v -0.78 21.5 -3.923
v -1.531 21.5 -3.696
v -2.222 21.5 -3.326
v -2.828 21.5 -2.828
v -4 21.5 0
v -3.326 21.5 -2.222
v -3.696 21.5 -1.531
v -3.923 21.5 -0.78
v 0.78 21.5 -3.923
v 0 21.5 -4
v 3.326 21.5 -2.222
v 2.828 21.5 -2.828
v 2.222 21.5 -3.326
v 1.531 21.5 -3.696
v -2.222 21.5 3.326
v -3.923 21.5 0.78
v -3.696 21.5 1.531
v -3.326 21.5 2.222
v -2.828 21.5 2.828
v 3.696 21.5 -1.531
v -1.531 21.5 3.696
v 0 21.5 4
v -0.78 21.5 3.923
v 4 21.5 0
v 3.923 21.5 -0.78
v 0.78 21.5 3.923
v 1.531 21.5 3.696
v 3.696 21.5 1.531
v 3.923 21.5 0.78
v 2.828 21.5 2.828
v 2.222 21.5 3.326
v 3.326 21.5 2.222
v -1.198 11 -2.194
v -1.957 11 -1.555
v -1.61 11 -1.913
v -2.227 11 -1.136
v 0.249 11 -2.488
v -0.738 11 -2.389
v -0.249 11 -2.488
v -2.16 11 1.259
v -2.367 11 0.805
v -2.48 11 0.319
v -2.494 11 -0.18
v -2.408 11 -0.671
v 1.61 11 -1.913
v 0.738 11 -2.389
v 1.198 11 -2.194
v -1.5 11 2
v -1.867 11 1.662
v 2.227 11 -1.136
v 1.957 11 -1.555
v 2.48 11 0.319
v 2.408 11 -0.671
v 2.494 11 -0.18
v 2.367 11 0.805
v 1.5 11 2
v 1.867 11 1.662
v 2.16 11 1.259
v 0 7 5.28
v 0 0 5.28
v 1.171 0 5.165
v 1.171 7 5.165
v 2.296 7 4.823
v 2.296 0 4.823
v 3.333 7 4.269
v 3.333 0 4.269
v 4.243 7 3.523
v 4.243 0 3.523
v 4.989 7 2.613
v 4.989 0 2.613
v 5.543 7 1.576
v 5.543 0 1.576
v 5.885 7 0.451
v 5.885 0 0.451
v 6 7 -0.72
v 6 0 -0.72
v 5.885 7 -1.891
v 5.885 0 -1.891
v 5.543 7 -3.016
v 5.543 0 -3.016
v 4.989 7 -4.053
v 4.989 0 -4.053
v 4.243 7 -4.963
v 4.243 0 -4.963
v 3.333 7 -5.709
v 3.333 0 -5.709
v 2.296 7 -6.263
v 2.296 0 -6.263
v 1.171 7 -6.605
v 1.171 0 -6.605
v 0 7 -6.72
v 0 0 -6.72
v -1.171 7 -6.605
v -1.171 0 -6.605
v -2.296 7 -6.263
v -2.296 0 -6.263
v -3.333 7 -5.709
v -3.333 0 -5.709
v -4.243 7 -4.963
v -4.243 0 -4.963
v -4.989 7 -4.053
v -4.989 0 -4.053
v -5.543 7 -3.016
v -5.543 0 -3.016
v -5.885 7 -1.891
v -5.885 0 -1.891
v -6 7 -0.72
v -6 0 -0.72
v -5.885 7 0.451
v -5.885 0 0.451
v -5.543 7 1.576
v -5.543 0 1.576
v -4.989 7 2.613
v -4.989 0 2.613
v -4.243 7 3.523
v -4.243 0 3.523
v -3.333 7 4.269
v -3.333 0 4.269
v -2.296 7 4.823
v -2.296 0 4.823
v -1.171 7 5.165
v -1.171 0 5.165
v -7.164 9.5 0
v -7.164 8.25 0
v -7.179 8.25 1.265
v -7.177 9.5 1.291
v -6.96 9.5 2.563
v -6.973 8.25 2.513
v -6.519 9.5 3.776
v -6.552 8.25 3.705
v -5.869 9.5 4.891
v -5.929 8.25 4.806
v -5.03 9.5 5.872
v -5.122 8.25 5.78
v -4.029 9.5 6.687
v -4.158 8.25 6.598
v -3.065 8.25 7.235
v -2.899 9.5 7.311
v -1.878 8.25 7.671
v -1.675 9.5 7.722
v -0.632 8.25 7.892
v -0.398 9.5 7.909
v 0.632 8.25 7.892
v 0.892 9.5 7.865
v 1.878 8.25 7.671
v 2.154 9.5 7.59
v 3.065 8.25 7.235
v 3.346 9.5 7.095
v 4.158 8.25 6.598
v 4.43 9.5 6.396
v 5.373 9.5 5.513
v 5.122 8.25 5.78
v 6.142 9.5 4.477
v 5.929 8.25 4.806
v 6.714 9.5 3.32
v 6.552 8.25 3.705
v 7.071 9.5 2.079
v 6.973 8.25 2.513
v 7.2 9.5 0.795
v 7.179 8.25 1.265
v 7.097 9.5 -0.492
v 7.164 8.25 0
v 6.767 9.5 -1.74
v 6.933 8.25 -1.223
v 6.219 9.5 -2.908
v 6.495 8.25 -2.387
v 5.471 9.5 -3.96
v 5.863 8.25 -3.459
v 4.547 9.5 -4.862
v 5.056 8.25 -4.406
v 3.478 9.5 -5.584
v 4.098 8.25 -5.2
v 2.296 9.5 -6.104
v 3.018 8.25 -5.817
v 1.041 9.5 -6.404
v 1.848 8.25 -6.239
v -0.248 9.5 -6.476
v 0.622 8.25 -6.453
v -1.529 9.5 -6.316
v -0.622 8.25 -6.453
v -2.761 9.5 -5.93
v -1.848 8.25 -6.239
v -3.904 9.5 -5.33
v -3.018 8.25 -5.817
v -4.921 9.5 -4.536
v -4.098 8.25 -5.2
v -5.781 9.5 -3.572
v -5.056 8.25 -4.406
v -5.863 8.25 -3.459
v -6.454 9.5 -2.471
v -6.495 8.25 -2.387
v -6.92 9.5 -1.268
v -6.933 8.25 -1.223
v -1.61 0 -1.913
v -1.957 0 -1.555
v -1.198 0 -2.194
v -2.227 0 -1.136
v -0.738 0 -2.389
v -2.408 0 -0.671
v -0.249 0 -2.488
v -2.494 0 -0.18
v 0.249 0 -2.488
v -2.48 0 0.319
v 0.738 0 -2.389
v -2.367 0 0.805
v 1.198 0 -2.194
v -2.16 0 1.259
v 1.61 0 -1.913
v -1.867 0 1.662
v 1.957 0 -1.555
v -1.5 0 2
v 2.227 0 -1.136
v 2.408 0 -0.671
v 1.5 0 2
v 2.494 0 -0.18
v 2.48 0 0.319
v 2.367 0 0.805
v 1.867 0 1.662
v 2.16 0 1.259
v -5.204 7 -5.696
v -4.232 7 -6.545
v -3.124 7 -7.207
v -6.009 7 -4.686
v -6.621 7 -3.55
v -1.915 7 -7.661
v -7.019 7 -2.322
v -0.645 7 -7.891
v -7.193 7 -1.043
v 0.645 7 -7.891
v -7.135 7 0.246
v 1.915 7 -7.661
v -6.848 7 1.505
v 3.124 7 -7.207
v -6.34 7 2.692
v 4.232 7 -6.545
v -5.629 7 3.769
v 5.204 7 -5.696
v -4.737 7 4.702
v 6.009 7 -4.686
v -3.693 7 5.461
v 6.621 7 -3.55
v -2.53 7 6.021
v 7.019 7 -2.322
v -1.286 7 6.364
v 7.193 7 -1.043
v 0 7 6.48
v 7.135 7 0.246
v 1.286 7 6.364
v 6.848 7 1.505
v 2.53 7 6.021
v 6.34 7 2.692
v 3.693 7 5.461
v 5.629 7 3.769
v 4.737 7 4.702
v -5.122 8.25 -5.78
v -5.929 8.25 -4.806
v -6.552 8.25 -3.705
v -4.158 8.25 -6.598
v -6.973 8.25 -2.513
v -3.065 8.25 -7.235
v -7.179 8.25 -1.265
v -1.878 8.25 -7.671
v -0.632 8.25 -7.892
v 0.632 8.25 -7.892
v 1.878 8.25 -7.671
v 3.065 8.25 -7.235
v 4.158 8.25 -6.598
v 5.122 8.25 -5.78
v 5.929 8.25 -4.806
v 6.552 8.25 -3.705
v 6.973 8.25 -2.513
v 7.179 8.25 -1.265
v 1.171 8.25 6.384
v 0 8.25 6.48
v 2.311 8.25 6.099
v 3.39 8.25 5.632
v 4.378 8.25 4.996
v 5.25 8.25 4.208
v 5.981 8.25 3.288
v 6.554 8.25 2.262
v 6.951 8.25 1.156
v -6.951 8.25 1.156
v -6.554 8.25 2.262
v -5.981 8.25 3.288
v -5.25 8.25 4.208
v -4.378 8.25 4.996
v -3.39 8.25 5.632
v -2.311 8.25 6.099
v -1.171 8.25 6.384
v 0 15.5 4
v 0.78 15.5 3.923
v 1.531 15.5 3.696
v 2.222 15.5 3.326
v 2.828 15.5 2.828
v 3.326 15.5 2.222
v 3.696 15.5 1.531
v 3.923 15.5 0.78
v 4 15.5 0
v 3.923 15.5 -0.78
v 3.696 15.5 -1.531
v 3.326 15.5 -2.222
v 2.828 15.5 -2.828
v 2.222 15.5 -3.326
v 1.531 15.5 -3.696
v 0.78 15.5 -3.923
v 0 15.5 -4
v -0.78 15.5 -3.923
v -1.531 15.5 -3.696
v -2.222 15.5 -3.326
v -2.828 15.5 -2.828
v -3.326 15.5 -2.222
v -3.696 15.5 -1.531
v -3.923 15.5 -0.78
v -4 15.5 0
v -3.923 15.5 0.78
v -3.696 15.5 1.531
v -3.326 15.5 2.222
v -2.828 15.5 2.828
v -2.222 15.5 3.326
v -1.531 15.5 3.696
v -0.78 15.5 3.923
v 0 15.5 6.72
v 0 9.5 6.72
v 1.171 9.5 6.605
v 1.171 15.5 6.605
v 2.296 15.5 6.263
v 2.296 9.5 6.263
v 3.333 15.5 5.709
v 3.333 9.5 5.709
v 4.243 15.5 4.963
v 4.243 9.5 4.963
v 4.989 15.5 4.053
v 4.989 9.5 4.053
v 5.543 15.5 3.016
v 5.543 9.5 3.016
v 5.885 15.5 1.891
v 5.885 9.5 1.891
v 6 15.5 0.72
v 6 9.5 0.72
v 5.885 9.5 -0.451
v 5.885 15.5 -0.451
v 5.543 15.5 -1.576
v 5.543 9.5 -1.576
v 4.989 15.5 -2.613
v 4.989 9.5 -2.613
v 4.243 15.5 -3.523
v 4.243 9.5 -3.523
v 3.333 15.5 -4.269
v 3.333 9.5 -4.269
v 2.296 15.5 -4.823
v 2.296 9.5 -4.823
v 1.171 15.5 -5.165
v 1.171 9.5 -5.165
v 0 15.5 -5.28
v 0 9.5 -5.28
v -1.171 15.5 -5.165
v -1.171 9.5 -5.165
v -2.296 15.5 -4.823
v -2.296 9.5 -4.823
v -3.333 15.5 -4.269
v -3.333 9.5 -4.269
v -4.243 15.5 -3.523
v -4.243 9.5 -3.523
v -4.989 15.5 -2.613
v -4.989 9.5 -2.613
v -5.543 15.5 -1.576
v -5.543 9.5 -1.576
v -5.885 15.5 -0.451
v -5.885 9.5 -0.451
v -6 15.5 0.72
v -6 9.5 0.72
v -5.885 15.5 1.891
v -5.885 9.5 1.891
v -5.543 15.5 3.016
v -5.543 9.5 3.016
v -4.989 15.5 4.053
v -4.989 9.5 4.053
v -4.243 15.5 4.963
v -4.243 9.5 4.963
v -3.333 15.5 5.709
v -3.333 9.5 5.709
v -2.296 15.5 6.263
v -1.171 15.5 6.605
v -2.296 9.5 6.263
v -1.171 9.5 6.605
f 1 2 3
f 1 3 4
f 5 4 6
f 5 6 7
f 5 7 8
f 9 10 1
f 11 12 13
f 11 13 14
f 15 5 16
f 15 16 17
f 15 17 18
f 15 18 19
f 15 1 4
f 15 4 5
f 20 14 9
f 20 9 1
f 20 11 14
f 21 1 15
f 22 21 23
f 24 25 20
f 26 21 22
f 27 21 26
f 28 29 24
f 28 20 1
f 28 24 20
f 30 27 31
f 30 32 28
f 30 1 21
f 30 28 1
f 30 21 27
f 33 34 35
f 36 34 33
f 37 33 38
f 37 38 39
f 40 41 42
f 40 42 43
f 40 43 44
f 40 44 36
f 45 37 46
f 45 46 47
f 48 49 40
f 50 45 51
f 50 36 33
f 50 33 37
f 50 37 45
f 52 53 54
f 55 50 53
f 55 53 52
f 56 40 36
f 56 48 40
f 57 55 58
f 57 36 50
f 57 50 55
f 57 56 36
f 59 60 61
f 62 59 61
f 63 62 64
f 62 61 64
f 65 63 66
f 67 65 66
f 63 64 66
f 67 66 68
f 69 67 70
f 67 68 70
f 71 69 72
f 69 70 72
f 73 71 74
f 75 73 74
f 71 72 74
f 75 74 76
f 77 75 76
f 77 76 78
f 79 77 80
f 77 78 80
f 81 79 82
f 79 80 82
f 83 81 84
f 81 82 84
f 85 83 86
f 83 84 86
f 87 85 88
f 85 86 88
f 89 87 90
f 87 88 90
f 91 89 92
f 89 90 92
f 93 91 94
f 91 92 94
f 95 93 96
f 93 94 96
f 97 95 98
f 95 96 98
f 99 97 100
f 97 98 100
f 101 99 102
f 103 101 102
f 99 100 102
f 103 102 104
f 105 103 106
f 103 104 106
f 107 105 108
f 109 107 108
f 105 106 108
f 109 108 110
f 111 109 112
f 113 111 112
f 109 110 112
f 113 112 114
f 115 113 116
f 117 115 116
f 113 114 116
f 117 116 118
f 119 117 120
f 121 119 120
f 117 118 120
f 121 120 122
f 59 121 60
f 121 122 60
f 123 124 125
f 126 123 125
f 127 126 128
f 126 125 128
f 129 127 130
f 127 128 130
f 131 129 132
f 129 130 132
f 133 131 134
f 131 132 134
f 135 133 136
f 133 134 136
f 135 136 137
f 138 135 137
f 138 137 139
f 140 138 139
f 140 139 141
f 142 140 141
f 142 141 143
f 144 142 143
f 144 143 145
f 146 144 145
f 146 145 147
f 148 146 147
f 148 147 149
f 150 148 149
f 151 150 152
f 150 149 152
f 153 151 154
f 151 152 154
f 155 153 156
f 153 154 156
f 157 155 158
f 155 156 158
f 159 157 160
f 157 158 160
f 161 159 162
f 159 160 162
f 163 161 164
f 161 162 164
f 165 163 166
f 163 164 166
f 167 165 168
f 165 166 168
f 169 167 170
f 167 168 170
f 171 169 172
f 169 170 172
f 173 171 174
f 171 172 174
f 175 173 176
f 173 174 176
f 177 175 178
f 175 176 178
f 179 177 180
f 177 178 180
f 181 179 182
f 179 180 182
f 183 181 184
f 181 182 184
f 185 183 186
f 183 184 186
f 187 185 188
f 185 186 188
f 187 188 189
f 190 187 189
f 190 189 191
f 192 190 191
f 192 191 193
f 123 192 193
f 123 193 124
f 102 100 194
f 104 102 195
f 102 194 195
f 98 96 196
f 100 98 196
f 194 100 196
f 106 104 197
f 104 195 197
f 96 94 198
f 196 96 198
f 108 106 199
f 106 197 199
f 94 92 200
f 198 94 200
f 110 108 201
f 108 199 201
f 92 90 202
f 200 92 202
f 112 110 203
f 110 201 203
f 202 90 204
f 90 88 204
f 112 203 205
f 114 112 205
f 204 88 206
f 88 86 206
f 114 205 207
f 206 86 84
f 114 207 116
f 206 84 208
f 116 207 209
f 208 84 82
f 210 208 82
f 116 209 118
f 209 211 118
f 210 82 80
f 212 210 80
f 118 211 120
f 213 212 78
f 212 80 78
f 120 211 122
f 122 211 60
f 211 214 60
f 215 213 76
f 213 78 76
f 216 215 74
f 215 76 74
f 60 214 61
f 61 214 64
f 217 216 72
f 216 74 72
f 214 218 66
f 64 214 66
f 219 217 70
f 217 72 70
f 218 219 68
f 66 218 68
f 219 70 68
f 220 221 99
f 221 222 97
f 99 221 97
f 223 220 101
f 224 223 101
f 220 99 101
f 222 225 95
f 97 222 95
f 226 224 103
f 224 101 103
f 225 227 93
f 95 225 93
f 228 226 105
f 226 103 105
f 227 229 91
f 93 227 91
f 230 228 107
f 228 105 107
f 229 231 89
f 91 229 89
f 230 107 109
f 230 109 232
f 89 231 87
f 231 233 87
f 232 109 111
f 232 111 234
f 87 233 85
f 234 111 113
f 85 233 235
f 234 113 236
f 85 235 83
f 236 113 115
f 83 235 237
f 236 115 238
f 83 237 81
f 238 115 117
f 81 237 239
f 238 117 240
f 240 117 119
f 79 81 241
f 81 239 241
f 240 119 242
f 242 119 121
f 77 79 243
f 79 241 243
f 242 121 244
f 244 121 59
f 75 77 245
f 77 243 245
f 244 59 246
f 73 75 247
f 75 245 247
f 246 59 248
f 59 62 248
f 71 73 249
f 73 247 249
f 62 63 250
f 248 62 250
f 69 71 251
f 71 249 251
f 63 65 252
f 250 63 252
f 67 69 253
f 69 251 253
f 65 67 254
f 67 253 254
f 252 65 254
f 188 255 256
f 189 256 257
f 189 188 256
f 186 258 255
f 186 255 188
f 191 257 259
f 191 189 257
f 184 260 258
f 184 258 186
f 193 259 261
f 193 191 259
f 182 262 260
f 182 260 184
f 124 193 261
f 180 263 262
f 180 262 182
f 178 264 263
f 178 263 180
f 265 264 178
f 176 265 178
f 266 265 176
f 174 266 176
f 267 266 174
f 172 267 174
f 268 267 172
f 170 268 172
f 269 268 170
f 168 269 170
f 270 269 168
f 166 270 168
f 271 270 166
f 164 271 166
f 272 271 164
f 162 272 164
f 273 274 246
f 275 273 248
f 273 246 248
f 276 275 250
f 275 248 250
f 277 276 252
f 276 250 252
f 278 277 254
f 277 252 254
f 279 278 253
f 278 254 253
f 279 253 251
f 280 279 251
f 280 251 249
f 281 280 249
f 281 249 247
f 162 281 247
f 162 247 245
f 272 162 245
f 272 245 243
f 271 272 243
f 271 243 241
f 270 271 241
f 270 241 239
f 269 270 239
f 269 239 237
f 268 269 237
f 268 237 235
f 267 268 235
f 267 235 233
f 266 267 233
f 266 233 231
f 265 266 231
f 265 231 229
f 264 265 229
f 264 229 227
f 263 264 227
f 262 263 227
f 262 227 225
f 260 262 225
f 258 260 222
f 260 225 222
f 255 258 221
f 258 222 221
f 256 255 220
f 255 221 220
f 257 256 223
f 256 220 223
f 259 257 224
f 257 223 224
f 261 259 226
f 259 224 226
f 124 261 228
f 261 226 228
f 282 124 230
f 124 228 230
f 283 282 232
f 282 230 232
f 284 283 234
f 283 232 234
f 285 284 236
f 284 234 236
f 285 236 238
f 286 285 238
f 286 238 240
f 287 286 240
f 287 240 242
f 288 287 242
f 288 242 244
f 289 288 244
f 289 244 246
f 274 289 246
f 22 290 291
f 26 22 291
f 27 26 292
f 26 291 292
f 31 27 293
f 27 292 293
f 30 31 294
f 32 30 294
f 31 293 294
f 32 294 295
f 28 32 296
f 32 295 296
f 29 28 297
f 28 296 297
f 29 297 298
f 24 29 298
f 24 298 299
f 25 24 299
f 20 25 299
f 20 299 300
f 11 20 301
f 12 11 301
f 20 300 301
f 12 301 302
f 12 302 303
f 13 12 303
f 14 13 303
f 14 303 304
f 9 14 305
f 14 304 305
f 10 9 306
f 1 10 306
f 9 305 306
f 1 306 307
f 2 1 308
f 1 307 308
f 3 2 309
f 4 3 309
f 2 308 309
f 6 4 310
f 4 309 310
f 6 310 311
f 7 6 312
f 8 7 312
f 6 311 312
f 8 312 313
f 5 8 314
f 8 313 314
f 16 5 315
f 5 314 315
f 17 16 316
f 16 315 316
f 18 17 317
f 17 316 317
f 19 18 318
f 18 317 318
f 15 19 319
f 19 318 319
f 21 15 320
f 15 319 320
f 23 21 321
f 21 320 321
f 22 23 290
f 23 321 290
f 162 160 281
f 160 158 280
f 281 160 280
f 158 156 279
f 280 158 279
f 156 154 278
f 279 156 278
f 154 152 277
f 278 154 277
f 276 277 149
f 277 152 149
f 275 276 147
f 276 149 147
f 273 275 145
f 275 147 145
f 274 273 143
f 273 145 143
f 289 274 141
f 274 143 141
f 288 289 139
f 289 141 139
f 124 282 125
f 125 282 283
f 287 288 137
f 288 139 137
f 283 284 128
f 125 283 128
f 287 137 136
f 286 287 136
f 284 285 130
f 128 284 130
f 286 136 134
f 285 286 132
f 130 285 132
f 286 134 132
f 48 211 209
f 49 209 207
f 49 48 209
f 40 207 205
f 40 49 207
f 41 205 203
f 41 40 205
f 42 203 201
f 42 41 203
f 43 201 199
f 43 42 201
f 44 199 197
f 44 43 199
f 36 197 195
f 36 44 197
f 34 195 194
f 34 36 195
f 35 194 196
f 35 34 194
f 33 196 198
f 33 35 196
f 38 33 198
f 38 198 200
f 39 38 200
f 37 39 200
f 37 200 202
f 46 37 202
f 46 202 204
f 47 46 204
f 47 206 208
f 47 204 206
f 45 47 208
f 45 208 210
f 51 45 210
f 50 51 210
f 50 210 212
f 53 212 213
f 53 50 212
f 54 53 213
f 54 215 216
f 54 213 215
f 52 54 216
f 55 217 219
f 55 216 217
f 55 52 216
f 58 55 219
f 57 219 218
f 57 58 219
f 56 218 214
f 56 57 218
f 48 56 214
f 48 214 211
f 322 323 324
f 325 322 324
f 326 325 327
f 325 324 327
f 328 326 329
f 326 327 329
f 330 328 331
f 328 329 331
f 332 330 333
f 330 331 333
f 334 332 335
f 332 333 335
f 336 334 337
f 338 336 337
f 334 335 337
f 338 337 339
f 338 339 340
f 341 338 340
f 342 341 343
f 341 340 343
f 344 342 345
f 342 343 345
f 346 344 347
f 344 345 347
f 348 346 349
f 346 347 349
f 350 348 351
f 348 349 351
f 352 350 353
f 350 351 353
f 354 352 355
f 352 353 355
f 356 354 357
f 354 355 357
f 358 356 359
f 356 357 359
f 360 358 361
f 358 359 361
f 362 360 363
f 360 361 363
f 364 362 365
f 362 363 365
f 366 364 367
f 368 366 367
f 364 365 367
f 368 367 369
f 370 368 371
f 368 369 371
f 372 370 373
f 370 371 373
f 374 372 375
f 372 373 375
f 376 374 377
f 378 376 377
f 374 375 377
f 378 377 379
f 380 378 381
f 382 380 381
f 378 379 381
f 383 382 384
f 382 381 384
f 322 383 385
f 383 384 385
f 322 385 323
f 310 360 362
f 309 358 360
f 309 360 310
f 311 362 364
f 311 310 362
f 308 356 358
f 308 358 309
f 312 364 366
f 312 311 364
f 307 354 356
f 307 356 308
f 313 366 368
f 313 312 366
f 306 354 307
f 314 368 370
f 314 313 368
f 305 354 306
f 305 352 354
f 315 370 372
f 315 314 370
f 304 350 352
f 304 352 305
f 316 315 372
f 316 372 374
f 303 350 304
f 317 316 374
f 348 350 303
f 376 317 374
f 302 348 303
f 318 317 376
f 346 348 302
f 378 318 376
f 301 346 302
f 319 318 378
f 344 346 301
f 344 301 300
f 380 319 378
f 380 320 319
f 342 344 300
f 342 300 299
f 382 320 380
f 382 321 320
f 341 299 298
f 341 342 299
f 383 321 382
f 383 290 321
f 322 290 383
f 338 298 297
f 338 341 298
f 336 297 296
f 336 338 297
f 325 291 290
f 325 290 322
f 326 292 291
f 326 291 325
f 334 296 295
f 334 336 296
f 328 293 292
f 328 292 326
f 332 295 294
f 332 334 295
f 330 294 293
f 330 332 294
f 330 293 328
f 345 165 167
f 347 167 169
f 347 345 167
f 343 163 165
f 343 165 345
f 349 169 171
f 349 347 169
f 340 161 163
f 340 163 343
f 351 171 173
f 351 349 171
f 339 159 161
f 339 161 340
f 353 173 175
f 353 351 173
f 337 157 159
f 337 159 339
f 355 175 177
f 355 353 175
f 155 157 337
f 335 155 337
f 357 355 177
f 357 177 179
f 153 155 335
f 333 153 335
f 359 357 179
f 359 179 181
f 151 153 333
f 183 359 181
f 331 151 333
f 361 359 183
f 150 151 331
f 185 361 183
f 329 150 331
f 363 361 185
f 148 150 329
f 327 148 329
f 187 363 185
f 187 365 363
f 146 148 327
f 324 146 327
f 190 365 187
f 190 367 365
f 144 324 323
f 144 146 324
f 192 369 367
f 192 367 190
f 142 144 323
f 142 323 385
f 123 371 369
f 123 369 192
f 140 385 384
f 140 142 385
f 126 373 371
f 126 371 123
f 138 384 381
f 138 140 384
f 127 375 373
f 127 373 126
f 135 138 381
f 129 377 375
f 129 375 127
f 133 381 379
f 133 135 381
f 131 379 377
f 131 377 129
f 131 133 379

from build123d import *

# Parameters (mm, degrees)
SKETCH1_R               = 6
BOSS_EXTRUDE1_DEPTH     = 7
SKETCH2_R               = 7.2
BOSS_EXTRUDE2_DEPTH     = 1.25
SKETCH3_R               = 7.2
BOSS_EXTRUDE3_DEPTH     = 1.25
SKETCH4_R               = 6
BOSS_EXTRUDE4_DEPTH     = 6
CUT_EXTRUDE2_DEPTH      = 19.836570813
CUT_EXTRUDE2_DEPTH_BACK = 11
SKETCH6_R               = 4
BOSS_EXTRUDE5_DEPTH     = 6


with BuildPart() as part:
    # Sketch1 → Boss-Extrude1 (new body)
    with BuildSketch(Plane(origin=(0, 0, 0), x_dir=(1, 0, 0), z_dir=(0, 1, 0))):
        with Locations(Location((0, 0.72, 0), (0, 0, 270))):
            Circle(SKETCH1_R)
    extrude(amount=BOSS_EXTRUDE1_DEPTH)

    # Sketch2 → Boss-Extrude2 (add)
    with BuildSketch(Plane(origin=(0, 7, 0), x_dir=(1, 0, 0), z_dir=(0, 1, 0))):
        with Locations(Location((0, 0.72, 0), (0, 0, 270))):
            Circle(SKETCH2_R)
    extrude(amount=BOSS_EXTRUDE2_DEPTH)

    # Sketch3 → Boss-Extrude3 (add)
    with BuildSketch(Plane(origin=(0, 8.25, 0), x_dir=(1, 0, 0), z_dir=(0, 1, 0))):
        with Locations(Location((0, -0.72, 0), (0, 0, 174.260829523))):
            Circle(SKETCH3_R)
    extrude(amount=BOSS_EXTRUDE3_DEPTH)

    # Sketch4 → Boss-Extrude4 (add)
    with BuildSketch(Plane(origin=(0, 9.5, 0), x_dir=(1, 0, 0), z_dir=(0, 1, 0))):
        with Locations(Location((0, -0.72, 0), (0, 0, 270))):
            Circle(SKETCH4_R)
    extrude(amount=BOSS_EXTRUDE4_DEPTH)

    # Sketch5 → Cut-Extrude2 (cut, two sides: drawn at the far end of the back side and taken through both)
    with BuildSketch(Plane.XZ.offset(-CUT_EXTRUDE2_DEPTH_BACK)):
        with BuildLine():
            Line((1.5, 2), (-1.5, 2))
            ThreePointArc((-1.5, 2), (0, -2.5), (1.5, 2))
        make_face()
    extrude(amount=CUT_EXTRUDE2_DEPTH + CUT_EXTRUDE2_DEPTH_BACK, mode=Mode.SUBTRACT)

    # Sketch6 → Boss-Extrude5 (add)
    with BuildSketch(Plane(origin=(0, 15.5, 0), x_dir=(1, 0, 0), z_dir=(0, 1, 0))):
        with Locations(Location((0, 0, 0), (0, 0, 270))):
            Circle(SKETCH6_R)
    extrude(amount=BOSS_EXTRUDE5_DEPTH)


solid = part.part
